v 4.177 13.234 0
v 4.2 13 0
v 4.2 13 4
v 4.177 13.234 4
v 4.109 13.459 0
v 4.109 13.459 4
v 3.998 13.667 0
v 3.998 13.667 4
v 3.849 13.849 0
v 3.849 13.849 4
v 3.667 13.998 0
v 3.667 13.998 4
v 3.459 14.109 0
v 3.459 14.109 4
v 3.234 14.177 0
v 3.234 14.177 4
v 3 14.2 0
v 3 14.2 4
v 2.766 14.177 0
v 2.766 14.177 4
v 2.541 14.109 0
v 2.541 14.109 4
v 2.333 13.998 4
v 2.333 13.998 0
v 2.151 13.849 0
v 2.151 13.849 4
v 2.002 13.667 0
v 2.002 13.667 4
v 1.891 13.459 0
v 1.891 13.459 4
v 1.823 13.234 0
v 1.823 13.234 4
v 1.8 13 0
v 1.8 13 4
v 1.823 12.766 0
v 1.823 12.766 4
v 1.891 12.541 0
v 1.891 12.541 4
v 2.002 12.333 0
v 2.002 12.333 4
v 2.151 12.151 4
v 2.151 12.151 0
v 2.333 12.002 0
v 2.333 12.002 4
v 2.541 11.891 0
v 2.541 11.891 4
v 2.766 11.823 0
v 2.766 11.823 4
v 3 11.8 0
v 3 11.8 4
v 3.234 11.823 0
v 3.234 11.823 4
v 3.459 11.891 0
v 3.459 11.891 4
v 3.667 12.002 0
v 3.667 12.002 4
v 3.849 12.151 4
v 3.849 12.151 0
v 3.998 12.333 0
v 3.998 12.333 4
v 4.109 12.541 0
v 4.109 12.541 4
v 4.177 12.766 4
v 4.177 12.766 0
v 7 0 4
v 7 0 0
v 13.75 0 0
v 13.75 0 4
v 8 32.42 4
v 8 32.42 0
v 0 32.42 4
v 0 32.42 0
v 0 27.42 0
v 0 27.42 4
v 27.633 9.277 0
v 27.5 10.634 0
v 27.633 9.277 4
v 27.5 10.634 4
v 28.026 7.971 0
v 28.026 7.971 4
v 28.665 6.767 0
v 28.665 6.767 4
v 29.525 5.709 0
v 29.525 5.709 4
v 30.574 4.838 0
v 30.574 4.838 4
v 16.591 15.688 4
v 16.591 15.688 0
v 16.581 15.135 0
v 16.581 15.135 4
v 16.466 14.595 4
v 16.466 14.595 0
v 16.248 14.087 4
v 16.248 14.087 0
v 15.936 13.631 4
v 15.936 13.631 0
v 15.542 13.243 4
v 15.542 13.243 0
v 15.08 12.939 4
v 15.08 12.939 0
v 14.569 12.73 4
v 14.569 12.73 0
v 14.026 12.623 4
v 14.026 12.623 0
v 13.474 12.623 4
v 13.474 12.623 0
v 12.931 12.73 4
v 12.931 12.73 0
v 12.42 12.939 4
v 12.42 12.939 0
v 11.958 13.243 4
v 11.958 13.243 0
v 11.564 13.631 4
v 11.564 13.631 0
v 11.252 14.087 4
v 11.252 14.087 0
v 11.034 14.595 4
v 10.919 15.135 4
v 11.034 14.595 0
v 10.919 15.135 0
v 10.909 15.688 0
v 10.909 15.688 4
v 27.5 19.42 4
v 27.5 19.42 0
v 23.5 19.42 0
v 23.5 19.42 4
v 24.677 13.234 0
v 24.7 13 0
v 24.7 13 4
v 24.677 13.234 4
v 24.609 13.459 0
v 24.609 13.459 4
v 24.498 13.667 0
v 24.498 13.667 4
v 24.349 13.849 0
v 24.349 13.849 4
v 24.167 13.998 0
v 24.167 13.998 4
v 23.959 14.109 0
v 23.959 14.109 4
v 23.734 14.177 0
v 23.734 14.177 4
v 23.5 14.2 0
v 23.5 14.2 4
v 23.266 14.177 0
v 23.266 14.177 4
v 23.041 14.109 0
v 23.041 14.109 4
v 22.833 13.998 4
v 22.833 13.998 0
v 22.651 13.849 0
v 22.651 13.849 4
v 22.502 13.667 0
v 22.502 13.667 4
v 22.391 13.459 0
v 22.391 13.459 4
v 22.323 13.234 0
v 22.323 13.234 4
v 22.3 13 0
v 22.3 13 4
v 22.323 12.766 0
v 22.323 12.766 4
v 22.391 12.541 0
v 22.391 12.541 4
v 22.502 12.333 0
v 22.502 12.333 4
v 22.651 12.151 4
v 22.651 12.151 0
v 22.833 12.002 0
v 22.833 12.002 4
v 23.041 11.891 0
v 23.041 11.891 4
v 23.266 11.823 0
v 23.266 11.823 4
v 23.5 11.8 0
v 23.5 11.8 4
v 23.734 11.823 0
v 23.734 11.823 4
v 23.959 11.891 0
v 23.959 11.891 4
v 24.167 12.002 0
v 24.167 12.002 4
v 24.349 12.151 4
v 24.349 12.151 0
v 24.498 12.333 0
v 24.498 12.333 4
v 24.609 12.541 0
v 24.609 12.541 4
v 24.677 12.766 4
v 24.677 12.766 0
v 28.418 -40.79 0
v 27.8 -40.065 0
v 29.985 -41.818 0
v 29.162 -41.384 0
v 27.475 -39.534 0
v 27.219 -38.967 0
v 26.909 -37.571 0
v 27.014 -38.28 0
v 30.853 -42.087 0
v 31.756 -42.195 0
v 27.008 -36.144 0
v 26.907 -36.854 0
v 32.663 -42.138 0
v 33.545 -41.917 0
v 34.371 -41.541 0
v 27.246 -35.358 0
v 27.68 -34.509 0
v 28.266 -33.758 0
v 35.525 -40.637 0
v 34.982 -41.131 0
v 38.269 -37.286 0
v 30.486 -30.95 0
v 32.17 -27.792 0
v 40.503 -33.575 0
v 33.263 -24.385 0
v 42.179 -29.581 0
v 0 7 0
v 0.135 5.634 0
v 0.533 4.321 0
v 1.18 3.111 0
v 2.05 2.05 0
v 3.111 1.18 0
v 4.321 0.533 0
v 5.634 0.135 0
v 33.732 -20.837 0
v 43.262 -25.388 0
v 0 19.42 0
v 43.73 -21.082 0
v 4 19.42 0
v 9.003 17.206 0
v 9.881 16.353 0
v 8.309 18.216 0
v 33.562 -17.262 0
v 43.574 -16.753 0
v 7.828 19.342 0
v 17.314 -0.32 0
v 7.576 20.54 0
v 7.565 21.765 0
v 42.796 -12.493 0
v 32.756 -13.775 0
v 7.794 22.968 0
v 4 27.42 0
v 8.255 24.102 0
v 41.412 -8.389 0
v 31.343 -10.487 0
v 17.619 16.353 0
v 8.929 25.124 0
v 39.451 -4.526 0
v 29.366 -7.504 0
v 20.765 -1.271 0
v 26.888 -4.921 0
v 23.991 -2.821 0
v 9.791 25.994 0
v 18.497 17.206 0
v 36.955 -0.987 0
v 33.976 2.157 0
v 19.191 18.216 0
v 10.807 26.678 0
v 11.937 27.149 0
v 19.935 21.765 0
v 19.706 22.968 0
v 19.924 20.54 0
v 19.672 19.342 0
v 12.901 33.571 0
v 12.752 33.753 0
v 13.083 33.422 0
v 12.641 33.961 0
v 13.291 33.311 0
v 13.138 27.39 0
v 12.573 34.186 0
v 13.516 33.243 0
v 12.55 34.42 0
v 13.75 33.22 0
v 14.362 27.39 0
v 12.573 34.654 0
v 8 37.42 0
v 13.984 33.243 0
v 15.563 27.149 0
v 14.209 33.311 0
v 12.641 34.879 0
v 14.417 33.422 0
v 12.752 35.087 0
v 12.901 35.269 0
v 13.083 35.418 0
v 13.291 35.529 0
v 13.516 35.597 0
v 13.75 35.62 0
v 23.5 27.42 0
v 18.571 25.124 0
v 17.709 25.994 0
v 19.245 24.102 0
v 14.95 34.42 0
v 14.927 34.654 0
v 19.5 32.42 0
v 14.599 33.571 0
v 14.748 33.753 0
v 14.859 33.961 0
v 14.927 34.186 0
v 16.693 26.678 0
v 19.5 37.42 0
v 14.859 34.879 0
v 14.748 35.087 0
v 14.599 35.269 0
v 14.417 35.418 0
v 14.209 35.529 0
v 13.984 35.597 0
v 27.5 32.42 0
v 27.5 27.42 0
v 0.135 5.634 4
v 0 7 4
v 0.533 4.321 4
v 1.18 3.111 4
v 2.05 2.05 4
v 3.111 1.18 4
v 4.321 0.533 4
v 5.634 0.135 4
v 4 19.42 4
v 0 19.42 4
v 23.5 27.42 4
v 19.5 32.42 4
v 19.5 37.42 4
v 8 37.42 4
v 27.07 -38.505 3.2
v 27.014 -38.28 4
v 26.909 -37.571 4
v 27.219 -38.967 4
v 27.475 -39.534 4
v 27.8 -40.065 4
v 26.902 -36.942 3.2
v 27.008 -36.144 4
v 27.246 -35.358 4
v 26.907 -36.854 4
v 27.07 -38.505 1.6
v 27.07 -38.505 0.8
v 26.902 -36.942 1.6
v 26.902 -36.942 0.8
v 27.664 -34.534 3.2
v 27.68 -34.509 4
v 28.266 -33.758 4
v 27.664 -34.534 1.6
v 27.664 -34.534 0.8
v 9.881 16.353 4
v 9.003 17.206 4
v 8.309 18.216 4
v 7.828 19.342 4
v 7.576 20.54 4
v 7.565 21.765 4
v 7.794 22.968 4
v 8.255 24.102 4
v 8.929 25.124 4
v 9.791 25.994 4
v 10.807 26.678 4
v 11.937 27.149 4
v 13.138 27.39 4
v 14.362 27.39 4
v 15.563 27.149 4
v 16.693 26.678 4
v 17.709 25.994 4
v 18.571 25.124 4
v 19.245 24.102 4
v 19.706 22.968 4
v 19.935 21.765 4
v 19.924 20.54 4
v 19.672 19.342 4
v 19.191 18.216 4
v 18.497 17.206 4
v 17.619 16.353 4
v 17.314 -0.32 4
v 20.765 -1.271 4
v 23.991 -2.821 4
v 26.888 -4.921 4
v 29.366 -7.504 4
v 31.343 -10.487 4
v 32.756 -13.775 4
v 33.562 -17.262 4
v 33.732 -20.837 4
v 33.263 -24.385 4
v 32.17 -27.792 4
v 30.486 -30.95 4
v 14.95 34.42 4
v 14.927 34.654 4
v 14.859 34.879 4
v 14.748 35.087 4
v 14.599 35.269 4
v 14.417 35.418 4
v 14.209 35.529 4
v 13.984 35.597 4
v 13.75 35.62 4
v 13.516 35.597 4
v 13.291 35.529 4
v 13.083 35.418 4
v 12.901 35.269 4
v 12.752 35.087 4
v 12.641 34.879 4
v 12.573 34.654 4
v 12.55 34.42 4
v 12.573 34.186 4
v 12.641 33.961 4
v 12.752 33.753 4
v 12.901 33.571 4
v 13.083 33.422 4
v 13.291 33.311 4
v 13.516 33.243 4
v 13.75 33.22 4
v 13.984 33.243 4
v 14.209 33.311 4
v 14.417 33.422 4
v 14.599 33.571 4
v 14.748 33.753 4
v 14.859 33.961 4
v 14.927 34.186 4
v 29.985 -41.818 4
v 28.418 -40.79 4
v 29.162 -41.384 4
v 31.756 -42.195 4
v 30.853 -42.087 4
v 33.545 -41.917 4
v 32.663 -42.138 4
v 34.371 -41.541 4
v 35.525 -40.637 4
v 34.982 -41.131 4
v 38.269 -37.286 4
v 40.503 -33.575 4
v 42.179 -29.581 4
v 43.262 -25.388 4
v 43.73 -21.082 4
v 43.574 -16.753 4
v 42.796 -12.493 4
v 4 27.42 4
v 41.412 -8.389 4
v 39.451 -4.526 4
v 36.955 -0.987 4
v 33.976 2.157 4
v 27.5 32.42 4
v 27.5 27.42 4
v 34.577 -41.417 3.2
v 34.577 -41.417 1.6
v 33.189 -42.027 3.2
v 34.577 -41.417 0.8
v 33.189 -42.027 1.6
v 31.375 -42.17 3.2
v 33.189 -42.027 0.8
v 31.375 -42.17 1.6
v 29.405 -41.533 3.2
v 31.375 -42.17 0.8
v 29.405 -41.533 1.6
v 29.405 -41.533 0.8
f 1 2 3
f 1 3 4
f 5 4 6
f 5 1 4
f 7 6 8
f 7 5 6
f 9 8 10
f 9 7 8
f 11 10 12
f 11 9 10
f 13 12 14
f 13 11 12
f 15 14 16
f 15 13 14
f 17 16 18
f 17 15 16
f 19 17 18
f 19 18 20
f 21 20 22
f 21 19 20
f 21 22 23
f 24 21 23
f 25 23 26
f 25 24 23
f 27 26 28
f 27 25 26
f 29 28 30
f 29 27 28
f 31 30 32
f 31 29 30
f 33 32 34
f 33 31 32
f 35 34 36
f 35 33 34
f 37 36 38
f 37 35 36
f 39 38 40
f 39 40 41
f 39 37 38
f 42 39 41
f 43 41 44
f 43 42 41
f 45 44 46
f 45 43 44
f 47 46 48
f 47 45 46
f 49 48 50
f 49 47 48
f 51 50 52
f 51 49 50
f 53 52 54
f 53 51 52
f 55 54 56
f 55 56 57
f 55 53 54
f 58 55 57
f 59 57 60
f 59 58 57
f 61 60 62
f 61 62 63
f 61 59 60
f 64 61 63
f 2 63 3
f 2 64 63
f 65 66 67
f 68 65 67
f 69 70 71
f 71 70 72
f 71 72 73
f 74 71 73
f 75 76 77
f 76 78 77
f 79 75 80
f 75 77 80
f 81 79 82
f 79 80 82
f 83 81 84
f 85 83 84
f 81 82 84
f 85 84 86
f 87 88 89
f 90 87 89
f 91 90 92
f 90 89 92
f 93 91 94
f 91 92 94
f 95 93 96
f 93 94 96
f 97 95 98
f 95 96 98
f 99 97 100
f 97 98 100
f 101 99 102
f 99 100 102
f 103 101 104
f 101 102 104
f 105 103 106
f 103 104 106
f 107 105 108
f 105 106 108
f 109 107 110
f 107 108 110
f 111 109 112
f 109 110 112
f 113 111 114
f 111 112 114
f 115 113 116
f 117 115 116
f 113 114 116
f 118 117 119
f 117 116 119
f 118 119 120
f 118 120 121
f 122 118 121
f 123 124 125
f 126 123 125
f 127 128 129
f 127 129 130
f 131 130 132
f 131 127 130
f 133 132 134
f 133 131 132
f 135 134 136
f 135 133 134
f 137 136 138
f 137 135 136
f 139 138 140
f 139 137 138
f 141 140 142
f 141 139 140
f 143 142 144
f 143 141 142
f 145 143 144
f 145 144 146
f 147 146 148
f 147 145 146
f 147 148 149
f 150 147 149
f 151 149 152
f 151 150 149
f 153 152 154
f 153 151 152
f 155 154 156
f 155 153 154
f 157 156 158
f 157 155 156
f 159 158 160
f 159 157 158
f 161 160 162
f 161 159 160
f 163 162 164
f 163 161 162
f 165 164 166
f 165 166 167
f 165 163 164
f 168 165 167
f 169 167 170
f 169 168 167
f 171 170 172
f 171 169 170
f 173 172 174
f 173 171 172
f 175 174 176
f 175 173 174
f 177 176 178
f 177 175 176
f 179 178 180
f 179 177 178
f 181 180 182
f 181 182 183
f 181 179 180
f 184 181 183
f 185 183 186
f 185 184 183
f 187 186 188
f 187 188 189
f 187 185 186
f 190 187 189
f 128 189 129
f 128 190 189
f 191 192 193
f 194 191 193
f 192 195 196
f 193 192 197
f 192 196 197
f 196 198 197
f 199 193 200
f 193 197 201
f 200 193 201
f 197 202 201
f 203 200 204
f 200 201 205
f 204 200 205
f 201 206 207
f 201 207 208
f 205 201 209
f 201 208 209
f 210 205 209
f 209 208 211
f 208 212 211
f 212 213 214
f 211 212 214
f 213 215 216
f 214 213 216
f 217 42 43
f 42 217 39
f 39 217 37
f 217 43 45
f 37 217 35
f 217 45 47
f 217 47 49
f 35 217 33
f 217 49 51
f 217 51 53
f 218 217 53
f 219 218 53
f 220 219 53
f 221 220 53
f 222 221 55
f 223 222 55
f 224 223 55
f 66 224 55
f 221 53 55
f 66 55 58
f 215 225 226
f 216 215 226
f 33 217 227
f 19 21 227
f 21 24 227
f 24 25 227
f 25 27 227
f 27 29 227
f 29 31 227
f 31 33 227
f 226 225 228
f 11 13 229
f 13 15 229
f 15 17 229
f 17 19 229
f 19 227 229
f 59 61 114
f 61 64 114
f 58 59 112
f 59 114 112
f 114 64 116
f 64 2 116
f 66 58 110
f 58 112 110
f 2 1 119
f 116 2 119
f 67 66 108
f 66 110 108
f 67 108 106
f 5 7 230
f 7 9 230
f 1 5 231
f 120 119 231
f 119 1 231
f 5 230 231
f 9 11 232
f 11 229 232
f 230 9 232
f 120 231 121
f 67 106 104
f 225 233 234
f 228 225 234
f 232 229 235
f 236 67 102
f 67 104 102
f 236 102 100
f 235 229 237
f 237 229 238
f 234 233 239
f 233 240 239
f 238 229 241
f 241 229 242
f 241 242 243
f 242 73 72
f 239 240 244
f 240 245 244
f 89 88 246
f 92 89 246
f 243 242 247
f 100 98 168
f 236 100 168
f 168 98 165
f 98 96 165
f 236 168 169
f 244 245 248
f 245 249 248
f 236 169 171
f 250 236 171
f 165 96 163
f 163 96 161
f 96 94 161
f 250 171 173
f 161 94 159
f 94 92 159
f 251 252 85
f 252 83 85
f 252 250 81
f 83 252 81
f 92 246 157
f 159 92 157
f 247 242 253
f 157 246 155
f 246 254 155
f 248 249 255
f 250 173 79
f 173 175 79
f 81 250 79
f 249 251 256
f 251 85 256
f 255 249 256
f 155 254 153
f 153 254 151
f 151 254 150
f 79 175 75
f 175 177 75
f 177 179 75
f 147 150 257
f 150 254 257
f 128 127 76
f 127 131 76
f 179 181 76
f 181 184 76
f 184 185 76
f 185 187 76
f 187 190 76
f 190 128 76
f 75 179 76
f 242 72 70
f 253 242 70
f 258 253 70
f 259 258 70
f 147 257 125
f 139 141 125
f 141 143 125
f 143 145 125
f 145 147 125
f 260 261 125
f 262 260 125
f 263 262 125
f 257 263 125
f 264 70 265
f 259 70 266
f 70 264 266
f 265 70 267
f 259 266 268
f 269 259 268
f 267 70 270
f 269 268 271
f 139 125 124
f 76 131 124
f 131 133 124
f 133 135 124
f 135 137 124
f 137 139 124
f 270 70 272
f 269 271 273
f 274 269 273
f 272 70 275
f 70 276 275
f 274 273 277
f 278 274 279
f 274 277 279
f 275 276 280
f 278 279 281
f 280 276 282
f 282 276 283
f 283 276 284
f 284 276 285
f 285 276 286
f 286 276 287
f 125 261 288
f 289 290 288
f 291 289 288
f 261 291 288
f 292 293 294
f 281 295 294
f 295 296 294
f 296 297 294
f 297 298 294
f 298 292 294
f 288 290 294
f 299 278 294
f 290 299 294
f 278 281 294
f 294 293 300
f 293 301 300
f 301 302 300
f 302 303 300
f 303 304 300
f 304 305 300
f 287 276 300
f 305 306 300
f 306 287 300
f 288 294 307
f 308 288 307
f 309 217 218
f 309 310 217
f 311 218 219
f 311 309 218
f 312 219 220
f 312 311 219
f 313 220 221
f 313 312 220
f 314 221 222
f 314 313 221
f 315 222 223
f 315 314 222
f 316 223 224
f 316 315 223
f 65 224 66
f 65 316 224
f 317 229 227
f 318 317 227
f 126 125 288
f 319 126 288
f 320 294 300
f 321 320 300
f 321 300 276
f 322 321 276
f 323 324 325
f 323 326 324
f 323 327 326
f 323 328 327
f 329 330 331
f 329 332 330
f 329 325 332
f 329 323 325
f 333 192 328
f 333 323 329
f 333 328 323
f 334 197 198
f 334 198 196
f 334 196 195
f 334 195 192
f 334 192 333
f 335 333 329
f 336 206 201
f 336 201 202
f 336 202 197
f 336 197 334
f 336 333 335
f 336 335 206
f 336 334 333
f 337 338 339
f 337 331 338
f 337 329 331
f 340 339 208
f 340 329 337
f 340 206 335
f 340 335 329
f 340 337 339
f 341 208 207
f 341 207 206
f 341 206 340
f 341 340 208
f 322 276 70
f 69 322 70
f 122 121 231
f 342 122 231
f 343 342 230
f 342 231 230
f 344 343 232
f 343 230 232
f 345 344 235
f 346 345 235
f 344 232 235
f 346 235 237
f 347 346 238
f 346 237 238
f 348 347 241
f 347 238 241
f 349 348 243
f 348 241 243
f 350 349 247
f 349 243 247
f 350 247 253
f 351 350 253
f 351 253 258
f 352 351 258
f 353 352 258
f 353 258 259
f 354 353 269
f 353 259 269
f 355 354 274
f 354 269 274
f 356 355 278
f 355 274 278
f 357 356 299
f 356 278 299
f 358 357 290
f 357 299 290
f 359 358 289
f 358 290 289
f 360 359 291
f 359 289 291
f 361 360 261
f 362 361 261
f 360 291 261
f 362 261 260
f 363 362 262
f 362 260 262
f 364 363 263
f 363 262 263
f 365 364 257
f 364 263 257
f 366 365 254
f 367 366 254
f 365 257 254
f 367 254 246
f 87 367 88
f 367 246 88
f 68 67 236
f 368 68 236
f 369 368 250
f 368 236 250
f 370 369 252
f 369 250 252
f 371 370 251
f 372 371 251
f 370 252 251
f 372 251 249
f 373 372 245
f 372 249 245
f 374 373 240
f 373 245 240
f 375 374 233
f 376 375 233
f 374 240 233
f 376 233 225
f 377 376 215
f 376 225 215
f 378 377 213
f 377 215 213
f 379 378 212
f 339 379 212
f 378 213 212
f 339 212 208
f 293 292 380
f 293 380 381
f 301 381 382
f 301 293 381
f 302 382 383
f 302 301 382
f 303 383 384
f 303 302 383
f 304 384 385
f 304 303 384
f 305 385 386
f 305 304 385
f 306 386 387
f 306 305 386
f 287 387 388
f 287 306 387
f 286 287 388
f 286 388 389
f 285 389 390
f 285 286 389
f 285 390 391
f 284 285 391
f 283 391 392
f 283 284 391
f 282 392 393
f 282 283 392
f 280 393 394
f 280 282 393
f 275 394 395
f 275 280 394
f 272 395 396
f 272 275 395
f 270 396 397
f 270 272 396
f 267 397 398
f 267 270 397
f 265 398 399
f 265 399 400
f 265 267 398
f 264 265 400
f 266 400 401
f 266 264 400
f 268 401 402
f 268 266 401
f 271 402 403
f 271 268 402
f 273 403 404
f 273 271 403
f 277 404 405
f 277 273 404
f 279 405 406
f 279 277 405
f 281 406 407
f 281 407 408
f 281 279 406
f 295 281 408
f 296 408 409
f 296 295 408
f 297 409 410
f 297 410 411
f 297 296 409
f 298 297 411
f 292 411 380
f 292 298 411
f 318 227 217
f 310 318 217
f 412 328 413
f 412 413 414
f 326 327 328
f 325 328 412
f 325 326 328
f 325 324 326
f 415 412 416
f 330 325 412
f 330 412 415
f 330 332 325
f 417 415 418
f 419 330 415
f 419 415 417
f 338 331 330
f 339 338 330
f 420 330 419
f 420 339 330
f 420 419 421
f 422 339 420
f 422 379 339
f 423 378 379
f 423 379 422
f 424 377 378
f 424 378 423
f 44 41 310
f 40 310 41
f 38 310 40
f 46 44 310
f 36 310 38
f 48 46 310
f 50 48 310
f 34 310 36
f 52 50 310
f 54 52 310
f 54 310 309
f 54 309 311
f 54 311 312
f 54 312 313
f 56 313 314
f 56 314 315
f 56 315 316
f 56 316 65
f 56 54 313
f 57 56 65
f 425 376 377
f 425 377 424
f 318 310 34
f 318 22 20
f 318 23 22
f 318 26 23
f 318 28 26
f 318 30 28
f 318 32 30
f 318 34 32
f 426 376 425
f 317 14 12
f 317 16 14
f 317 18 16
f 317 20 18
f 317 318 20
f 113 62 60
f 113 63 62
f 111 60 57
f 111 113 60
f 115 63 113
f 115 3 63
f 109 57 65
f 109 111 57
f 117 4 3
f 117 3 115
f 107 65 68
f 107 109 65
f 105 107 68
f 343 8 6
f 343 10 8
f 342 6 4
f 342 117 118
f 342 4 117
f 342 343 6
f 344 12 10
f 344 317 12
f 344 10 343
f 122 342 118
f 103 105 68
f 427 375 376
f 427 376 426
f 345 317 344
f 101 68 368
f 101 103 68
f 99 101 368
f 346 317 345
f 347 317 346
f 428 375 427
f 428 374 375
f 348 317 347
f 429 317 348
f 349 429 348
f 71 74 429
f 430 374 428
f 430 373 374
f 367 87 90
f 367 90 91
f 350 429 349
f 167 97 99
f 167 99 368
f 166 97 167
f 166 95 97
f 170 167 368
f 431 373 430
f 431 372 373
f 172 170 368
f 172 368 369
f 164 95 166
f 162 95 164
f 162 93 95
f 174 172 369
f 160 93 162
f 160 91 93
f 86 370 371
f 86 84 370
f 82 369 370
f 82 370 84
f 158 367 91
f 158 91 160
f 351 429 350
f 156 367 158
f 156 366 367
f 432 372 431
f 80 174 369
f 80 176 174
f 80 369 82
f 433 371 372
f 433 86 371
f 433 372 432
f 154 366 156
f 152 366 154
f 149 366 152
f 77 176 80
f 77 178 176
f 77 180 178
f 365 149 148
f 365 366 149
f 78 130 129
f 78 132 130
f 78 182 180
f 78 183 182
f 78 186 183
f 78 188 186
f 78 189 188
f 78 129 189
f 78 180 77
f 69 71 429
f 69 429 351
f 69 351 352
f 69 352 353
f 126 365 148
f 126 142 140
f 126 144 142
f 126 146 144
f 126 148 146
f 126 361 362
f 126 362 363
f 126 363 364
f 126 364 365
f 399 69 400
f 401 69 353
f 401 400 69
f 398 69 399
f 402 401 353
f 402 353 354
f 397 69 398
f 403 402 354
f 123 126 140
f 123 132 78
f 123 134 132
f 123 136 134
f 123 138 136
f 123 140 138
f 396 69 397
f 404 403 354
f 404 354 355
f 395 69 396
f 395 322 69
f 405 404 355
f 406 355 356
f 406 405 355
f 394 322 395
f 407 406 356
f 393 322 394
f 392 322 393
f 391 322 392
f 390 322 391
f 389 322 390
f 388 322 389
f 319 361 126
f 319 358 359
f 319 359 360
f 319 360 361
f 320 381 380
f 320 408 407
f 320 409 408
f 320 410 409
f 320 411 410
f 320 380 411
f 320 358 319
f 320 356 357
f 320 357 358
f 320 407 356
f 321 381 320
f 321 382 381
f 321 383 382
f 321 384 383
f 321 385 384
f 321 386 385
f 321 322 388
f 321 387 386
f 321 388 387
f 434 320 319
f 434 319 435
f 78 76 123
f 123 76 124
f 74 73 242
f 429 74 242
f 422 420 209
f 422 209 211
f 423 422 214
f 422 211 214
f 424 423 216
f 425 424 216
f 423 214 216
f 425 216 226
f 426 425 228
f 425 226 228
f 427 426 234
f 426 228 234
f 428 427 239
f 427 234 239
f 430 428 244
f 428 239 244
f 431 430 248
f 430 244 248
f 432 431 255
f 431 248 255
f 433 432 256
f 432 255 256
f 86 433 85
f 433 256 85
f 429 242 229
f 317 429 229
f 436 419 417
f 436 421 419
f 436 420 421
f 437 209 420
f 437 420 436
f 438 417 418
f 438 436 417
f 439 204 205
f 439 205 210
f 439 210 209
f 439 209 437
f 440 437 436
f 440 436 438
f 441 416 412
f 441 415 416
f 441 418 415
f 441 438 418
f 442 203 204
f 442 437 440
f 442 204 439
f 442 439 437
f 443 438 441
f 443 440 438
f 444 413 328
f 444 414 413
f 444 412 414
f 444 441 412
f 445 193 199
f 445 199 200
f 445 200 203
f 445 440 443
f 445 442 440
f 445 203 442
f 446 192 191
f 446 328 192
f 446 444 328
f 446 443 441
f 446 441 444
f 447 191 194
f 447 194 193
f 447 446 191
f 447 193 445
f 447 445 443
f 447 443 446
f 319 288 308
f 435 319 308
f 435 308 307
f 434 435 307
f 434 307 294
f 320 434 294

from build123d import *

# Parameters (mm, degrees)
SKETCH1_R           = 1.2
BOSS_EXTRUDE1_DEPTH = 4
FILLET1_R           = 7
FILLET2_START       = -1
FILLET2_DEPTH       = 6


with BuildPart() as part:
    # Sketch1 → Boss-Extrude1 (new body)
    with BuildSketch(Plane.XY):
        with BuildLine():
            Line((8, 37.42), (8, 32.42))
            Line((8, 32.42), (0, 32.42))
            Line((0, 32.42), (0, 27.42))
            Line((0, 27.42), (4, 27.42))
            Line((4, 27.42), (4, 19.42))
            Line((4, 19.42), (0, 19.42))
            Line((0, 19.42), (0, 0))
            Line((0, 0), (13.75, 0))
            ThreePointArc((13.75, 0), (32.824339015, -13.98588401), (25.221528727, -36.383040886))
            Line((25.221528727, -36.383040886), (30.957293091, -44.574561329))
            ThreePointArc((30.957293091, -44.574561329), (43.681938755, -17.980336071), (27.5, 6.66341126))
            Line((27.5, 6.66341126), (27.5, 19.42))
            Line((27.5, 19.42), (23.5, 19.42))
            Line((23.5, 19.42), (23.5, 27.42))
            Line((23.5, 27.42), (27.5, 27.42))
            Line((27.5, 27.42), (27.5, 32.42))
            Line((27.5, 32.42), (19.5, 32.42))
            Line((19.5, 32.42), (19.5, 37.42))
            Line((19.5, 37.42), (8, 37.42))
        make_face()
        with Locations((3, 13)):
            Circle(SKETCH1_R, mode=Mode.SUBTRACT)
        with BuildLine():
            ThreePointArc((16.590873036, 15.687904348), (13.75, 12.61), (10.909126964, 15.687904348))
            ThreePointArc((10.909126964, 15.687904348), (13.75, 27.42), (16.590873036, 15.687904348))
        make_face(mode=Mode.SUBTRACT)
        with Locations((13.75, 34.42)):
            Circle(SKETCH1_R, mode=Mode.SUBTRACT)
        with Locations((23.5, 13)):
            Circle(SKETCH1_R, mode=Mode.SUBTRACT)
    extrude(amount=BOSS_EXTRUDE1_DEPTH)

    # Fillet1
    fillet1_edges = [part.edges().sort_by_distance(p)[0] for p in [
        (27.5, 6.66341126, 2),
        (0, 0, 2),
    ]]
    fillet(fillet1_edges, radius=FILLET1_R)

    # Fillet2: read off the stored shape, not the designer's step
    # Fillet2 outline → Fillet2 (cut)
    with BuildSketch(Plane.XY.offset(FILLET2_START)):
        with BuildLine():
            ThreePointArc((30.957293091, -44.574561329), (33.340121642, -42.720632343), (35.524547437, -40.636595745))
            add(Edge.make_bspline(
                [(35.524547437, -40.636595745), (34.55329691, -41.661403369), (33.063664011, -42.522816758), (31.099164619, -42.770231906), (29.107575632, -41.932891027), (27.799695976, -40.065045303)],
                knots=[0, 0, 0, 0, 0, 0, 0.550510257, 0.550510257, 0.550510257, 0.550510257, 0.550510257, 0.550510257], degree=5, weights=[1, 0.779795897, 0.620204103, 0.521224617, 0.48285744, 0.505102572]))
            Line((27.799695976, -40.065045303), (30.957293091, -44.574561329))
        make_face()
        with BuildLine():
            Line((25.221528727, -36.383040886), (27.799695976, -40.065045303))
            add(Edge.make_bspline(
                [(27.799695976, -40.065045303), (26.814281677, -38.657727837), (26.550577461, -37.082538129), (26.869269697, -35.66327749), (27.512411311, -34.553258967), (28.266364958, -33.757730497)],
                knots=[0.550510257, 0.550510257, 0.550510257, 0.550510257, 0.550510257, 0.550510257, 1, 1, 1, 1, 1, 1], degree=5, weights=[0.505102572, 0.523265646, 0.581836926, 0.680816412, 0.820204103, 1]))
            ThreePointArc((28.266364958, -33.757730497), (26.810081095, -35.147088229), (25.221528727, -36.383040886))
        make_face()
    extrude(amount=FILLET2_DEPTH, mode=Mode.SUBTRACT)


solid = part.part
